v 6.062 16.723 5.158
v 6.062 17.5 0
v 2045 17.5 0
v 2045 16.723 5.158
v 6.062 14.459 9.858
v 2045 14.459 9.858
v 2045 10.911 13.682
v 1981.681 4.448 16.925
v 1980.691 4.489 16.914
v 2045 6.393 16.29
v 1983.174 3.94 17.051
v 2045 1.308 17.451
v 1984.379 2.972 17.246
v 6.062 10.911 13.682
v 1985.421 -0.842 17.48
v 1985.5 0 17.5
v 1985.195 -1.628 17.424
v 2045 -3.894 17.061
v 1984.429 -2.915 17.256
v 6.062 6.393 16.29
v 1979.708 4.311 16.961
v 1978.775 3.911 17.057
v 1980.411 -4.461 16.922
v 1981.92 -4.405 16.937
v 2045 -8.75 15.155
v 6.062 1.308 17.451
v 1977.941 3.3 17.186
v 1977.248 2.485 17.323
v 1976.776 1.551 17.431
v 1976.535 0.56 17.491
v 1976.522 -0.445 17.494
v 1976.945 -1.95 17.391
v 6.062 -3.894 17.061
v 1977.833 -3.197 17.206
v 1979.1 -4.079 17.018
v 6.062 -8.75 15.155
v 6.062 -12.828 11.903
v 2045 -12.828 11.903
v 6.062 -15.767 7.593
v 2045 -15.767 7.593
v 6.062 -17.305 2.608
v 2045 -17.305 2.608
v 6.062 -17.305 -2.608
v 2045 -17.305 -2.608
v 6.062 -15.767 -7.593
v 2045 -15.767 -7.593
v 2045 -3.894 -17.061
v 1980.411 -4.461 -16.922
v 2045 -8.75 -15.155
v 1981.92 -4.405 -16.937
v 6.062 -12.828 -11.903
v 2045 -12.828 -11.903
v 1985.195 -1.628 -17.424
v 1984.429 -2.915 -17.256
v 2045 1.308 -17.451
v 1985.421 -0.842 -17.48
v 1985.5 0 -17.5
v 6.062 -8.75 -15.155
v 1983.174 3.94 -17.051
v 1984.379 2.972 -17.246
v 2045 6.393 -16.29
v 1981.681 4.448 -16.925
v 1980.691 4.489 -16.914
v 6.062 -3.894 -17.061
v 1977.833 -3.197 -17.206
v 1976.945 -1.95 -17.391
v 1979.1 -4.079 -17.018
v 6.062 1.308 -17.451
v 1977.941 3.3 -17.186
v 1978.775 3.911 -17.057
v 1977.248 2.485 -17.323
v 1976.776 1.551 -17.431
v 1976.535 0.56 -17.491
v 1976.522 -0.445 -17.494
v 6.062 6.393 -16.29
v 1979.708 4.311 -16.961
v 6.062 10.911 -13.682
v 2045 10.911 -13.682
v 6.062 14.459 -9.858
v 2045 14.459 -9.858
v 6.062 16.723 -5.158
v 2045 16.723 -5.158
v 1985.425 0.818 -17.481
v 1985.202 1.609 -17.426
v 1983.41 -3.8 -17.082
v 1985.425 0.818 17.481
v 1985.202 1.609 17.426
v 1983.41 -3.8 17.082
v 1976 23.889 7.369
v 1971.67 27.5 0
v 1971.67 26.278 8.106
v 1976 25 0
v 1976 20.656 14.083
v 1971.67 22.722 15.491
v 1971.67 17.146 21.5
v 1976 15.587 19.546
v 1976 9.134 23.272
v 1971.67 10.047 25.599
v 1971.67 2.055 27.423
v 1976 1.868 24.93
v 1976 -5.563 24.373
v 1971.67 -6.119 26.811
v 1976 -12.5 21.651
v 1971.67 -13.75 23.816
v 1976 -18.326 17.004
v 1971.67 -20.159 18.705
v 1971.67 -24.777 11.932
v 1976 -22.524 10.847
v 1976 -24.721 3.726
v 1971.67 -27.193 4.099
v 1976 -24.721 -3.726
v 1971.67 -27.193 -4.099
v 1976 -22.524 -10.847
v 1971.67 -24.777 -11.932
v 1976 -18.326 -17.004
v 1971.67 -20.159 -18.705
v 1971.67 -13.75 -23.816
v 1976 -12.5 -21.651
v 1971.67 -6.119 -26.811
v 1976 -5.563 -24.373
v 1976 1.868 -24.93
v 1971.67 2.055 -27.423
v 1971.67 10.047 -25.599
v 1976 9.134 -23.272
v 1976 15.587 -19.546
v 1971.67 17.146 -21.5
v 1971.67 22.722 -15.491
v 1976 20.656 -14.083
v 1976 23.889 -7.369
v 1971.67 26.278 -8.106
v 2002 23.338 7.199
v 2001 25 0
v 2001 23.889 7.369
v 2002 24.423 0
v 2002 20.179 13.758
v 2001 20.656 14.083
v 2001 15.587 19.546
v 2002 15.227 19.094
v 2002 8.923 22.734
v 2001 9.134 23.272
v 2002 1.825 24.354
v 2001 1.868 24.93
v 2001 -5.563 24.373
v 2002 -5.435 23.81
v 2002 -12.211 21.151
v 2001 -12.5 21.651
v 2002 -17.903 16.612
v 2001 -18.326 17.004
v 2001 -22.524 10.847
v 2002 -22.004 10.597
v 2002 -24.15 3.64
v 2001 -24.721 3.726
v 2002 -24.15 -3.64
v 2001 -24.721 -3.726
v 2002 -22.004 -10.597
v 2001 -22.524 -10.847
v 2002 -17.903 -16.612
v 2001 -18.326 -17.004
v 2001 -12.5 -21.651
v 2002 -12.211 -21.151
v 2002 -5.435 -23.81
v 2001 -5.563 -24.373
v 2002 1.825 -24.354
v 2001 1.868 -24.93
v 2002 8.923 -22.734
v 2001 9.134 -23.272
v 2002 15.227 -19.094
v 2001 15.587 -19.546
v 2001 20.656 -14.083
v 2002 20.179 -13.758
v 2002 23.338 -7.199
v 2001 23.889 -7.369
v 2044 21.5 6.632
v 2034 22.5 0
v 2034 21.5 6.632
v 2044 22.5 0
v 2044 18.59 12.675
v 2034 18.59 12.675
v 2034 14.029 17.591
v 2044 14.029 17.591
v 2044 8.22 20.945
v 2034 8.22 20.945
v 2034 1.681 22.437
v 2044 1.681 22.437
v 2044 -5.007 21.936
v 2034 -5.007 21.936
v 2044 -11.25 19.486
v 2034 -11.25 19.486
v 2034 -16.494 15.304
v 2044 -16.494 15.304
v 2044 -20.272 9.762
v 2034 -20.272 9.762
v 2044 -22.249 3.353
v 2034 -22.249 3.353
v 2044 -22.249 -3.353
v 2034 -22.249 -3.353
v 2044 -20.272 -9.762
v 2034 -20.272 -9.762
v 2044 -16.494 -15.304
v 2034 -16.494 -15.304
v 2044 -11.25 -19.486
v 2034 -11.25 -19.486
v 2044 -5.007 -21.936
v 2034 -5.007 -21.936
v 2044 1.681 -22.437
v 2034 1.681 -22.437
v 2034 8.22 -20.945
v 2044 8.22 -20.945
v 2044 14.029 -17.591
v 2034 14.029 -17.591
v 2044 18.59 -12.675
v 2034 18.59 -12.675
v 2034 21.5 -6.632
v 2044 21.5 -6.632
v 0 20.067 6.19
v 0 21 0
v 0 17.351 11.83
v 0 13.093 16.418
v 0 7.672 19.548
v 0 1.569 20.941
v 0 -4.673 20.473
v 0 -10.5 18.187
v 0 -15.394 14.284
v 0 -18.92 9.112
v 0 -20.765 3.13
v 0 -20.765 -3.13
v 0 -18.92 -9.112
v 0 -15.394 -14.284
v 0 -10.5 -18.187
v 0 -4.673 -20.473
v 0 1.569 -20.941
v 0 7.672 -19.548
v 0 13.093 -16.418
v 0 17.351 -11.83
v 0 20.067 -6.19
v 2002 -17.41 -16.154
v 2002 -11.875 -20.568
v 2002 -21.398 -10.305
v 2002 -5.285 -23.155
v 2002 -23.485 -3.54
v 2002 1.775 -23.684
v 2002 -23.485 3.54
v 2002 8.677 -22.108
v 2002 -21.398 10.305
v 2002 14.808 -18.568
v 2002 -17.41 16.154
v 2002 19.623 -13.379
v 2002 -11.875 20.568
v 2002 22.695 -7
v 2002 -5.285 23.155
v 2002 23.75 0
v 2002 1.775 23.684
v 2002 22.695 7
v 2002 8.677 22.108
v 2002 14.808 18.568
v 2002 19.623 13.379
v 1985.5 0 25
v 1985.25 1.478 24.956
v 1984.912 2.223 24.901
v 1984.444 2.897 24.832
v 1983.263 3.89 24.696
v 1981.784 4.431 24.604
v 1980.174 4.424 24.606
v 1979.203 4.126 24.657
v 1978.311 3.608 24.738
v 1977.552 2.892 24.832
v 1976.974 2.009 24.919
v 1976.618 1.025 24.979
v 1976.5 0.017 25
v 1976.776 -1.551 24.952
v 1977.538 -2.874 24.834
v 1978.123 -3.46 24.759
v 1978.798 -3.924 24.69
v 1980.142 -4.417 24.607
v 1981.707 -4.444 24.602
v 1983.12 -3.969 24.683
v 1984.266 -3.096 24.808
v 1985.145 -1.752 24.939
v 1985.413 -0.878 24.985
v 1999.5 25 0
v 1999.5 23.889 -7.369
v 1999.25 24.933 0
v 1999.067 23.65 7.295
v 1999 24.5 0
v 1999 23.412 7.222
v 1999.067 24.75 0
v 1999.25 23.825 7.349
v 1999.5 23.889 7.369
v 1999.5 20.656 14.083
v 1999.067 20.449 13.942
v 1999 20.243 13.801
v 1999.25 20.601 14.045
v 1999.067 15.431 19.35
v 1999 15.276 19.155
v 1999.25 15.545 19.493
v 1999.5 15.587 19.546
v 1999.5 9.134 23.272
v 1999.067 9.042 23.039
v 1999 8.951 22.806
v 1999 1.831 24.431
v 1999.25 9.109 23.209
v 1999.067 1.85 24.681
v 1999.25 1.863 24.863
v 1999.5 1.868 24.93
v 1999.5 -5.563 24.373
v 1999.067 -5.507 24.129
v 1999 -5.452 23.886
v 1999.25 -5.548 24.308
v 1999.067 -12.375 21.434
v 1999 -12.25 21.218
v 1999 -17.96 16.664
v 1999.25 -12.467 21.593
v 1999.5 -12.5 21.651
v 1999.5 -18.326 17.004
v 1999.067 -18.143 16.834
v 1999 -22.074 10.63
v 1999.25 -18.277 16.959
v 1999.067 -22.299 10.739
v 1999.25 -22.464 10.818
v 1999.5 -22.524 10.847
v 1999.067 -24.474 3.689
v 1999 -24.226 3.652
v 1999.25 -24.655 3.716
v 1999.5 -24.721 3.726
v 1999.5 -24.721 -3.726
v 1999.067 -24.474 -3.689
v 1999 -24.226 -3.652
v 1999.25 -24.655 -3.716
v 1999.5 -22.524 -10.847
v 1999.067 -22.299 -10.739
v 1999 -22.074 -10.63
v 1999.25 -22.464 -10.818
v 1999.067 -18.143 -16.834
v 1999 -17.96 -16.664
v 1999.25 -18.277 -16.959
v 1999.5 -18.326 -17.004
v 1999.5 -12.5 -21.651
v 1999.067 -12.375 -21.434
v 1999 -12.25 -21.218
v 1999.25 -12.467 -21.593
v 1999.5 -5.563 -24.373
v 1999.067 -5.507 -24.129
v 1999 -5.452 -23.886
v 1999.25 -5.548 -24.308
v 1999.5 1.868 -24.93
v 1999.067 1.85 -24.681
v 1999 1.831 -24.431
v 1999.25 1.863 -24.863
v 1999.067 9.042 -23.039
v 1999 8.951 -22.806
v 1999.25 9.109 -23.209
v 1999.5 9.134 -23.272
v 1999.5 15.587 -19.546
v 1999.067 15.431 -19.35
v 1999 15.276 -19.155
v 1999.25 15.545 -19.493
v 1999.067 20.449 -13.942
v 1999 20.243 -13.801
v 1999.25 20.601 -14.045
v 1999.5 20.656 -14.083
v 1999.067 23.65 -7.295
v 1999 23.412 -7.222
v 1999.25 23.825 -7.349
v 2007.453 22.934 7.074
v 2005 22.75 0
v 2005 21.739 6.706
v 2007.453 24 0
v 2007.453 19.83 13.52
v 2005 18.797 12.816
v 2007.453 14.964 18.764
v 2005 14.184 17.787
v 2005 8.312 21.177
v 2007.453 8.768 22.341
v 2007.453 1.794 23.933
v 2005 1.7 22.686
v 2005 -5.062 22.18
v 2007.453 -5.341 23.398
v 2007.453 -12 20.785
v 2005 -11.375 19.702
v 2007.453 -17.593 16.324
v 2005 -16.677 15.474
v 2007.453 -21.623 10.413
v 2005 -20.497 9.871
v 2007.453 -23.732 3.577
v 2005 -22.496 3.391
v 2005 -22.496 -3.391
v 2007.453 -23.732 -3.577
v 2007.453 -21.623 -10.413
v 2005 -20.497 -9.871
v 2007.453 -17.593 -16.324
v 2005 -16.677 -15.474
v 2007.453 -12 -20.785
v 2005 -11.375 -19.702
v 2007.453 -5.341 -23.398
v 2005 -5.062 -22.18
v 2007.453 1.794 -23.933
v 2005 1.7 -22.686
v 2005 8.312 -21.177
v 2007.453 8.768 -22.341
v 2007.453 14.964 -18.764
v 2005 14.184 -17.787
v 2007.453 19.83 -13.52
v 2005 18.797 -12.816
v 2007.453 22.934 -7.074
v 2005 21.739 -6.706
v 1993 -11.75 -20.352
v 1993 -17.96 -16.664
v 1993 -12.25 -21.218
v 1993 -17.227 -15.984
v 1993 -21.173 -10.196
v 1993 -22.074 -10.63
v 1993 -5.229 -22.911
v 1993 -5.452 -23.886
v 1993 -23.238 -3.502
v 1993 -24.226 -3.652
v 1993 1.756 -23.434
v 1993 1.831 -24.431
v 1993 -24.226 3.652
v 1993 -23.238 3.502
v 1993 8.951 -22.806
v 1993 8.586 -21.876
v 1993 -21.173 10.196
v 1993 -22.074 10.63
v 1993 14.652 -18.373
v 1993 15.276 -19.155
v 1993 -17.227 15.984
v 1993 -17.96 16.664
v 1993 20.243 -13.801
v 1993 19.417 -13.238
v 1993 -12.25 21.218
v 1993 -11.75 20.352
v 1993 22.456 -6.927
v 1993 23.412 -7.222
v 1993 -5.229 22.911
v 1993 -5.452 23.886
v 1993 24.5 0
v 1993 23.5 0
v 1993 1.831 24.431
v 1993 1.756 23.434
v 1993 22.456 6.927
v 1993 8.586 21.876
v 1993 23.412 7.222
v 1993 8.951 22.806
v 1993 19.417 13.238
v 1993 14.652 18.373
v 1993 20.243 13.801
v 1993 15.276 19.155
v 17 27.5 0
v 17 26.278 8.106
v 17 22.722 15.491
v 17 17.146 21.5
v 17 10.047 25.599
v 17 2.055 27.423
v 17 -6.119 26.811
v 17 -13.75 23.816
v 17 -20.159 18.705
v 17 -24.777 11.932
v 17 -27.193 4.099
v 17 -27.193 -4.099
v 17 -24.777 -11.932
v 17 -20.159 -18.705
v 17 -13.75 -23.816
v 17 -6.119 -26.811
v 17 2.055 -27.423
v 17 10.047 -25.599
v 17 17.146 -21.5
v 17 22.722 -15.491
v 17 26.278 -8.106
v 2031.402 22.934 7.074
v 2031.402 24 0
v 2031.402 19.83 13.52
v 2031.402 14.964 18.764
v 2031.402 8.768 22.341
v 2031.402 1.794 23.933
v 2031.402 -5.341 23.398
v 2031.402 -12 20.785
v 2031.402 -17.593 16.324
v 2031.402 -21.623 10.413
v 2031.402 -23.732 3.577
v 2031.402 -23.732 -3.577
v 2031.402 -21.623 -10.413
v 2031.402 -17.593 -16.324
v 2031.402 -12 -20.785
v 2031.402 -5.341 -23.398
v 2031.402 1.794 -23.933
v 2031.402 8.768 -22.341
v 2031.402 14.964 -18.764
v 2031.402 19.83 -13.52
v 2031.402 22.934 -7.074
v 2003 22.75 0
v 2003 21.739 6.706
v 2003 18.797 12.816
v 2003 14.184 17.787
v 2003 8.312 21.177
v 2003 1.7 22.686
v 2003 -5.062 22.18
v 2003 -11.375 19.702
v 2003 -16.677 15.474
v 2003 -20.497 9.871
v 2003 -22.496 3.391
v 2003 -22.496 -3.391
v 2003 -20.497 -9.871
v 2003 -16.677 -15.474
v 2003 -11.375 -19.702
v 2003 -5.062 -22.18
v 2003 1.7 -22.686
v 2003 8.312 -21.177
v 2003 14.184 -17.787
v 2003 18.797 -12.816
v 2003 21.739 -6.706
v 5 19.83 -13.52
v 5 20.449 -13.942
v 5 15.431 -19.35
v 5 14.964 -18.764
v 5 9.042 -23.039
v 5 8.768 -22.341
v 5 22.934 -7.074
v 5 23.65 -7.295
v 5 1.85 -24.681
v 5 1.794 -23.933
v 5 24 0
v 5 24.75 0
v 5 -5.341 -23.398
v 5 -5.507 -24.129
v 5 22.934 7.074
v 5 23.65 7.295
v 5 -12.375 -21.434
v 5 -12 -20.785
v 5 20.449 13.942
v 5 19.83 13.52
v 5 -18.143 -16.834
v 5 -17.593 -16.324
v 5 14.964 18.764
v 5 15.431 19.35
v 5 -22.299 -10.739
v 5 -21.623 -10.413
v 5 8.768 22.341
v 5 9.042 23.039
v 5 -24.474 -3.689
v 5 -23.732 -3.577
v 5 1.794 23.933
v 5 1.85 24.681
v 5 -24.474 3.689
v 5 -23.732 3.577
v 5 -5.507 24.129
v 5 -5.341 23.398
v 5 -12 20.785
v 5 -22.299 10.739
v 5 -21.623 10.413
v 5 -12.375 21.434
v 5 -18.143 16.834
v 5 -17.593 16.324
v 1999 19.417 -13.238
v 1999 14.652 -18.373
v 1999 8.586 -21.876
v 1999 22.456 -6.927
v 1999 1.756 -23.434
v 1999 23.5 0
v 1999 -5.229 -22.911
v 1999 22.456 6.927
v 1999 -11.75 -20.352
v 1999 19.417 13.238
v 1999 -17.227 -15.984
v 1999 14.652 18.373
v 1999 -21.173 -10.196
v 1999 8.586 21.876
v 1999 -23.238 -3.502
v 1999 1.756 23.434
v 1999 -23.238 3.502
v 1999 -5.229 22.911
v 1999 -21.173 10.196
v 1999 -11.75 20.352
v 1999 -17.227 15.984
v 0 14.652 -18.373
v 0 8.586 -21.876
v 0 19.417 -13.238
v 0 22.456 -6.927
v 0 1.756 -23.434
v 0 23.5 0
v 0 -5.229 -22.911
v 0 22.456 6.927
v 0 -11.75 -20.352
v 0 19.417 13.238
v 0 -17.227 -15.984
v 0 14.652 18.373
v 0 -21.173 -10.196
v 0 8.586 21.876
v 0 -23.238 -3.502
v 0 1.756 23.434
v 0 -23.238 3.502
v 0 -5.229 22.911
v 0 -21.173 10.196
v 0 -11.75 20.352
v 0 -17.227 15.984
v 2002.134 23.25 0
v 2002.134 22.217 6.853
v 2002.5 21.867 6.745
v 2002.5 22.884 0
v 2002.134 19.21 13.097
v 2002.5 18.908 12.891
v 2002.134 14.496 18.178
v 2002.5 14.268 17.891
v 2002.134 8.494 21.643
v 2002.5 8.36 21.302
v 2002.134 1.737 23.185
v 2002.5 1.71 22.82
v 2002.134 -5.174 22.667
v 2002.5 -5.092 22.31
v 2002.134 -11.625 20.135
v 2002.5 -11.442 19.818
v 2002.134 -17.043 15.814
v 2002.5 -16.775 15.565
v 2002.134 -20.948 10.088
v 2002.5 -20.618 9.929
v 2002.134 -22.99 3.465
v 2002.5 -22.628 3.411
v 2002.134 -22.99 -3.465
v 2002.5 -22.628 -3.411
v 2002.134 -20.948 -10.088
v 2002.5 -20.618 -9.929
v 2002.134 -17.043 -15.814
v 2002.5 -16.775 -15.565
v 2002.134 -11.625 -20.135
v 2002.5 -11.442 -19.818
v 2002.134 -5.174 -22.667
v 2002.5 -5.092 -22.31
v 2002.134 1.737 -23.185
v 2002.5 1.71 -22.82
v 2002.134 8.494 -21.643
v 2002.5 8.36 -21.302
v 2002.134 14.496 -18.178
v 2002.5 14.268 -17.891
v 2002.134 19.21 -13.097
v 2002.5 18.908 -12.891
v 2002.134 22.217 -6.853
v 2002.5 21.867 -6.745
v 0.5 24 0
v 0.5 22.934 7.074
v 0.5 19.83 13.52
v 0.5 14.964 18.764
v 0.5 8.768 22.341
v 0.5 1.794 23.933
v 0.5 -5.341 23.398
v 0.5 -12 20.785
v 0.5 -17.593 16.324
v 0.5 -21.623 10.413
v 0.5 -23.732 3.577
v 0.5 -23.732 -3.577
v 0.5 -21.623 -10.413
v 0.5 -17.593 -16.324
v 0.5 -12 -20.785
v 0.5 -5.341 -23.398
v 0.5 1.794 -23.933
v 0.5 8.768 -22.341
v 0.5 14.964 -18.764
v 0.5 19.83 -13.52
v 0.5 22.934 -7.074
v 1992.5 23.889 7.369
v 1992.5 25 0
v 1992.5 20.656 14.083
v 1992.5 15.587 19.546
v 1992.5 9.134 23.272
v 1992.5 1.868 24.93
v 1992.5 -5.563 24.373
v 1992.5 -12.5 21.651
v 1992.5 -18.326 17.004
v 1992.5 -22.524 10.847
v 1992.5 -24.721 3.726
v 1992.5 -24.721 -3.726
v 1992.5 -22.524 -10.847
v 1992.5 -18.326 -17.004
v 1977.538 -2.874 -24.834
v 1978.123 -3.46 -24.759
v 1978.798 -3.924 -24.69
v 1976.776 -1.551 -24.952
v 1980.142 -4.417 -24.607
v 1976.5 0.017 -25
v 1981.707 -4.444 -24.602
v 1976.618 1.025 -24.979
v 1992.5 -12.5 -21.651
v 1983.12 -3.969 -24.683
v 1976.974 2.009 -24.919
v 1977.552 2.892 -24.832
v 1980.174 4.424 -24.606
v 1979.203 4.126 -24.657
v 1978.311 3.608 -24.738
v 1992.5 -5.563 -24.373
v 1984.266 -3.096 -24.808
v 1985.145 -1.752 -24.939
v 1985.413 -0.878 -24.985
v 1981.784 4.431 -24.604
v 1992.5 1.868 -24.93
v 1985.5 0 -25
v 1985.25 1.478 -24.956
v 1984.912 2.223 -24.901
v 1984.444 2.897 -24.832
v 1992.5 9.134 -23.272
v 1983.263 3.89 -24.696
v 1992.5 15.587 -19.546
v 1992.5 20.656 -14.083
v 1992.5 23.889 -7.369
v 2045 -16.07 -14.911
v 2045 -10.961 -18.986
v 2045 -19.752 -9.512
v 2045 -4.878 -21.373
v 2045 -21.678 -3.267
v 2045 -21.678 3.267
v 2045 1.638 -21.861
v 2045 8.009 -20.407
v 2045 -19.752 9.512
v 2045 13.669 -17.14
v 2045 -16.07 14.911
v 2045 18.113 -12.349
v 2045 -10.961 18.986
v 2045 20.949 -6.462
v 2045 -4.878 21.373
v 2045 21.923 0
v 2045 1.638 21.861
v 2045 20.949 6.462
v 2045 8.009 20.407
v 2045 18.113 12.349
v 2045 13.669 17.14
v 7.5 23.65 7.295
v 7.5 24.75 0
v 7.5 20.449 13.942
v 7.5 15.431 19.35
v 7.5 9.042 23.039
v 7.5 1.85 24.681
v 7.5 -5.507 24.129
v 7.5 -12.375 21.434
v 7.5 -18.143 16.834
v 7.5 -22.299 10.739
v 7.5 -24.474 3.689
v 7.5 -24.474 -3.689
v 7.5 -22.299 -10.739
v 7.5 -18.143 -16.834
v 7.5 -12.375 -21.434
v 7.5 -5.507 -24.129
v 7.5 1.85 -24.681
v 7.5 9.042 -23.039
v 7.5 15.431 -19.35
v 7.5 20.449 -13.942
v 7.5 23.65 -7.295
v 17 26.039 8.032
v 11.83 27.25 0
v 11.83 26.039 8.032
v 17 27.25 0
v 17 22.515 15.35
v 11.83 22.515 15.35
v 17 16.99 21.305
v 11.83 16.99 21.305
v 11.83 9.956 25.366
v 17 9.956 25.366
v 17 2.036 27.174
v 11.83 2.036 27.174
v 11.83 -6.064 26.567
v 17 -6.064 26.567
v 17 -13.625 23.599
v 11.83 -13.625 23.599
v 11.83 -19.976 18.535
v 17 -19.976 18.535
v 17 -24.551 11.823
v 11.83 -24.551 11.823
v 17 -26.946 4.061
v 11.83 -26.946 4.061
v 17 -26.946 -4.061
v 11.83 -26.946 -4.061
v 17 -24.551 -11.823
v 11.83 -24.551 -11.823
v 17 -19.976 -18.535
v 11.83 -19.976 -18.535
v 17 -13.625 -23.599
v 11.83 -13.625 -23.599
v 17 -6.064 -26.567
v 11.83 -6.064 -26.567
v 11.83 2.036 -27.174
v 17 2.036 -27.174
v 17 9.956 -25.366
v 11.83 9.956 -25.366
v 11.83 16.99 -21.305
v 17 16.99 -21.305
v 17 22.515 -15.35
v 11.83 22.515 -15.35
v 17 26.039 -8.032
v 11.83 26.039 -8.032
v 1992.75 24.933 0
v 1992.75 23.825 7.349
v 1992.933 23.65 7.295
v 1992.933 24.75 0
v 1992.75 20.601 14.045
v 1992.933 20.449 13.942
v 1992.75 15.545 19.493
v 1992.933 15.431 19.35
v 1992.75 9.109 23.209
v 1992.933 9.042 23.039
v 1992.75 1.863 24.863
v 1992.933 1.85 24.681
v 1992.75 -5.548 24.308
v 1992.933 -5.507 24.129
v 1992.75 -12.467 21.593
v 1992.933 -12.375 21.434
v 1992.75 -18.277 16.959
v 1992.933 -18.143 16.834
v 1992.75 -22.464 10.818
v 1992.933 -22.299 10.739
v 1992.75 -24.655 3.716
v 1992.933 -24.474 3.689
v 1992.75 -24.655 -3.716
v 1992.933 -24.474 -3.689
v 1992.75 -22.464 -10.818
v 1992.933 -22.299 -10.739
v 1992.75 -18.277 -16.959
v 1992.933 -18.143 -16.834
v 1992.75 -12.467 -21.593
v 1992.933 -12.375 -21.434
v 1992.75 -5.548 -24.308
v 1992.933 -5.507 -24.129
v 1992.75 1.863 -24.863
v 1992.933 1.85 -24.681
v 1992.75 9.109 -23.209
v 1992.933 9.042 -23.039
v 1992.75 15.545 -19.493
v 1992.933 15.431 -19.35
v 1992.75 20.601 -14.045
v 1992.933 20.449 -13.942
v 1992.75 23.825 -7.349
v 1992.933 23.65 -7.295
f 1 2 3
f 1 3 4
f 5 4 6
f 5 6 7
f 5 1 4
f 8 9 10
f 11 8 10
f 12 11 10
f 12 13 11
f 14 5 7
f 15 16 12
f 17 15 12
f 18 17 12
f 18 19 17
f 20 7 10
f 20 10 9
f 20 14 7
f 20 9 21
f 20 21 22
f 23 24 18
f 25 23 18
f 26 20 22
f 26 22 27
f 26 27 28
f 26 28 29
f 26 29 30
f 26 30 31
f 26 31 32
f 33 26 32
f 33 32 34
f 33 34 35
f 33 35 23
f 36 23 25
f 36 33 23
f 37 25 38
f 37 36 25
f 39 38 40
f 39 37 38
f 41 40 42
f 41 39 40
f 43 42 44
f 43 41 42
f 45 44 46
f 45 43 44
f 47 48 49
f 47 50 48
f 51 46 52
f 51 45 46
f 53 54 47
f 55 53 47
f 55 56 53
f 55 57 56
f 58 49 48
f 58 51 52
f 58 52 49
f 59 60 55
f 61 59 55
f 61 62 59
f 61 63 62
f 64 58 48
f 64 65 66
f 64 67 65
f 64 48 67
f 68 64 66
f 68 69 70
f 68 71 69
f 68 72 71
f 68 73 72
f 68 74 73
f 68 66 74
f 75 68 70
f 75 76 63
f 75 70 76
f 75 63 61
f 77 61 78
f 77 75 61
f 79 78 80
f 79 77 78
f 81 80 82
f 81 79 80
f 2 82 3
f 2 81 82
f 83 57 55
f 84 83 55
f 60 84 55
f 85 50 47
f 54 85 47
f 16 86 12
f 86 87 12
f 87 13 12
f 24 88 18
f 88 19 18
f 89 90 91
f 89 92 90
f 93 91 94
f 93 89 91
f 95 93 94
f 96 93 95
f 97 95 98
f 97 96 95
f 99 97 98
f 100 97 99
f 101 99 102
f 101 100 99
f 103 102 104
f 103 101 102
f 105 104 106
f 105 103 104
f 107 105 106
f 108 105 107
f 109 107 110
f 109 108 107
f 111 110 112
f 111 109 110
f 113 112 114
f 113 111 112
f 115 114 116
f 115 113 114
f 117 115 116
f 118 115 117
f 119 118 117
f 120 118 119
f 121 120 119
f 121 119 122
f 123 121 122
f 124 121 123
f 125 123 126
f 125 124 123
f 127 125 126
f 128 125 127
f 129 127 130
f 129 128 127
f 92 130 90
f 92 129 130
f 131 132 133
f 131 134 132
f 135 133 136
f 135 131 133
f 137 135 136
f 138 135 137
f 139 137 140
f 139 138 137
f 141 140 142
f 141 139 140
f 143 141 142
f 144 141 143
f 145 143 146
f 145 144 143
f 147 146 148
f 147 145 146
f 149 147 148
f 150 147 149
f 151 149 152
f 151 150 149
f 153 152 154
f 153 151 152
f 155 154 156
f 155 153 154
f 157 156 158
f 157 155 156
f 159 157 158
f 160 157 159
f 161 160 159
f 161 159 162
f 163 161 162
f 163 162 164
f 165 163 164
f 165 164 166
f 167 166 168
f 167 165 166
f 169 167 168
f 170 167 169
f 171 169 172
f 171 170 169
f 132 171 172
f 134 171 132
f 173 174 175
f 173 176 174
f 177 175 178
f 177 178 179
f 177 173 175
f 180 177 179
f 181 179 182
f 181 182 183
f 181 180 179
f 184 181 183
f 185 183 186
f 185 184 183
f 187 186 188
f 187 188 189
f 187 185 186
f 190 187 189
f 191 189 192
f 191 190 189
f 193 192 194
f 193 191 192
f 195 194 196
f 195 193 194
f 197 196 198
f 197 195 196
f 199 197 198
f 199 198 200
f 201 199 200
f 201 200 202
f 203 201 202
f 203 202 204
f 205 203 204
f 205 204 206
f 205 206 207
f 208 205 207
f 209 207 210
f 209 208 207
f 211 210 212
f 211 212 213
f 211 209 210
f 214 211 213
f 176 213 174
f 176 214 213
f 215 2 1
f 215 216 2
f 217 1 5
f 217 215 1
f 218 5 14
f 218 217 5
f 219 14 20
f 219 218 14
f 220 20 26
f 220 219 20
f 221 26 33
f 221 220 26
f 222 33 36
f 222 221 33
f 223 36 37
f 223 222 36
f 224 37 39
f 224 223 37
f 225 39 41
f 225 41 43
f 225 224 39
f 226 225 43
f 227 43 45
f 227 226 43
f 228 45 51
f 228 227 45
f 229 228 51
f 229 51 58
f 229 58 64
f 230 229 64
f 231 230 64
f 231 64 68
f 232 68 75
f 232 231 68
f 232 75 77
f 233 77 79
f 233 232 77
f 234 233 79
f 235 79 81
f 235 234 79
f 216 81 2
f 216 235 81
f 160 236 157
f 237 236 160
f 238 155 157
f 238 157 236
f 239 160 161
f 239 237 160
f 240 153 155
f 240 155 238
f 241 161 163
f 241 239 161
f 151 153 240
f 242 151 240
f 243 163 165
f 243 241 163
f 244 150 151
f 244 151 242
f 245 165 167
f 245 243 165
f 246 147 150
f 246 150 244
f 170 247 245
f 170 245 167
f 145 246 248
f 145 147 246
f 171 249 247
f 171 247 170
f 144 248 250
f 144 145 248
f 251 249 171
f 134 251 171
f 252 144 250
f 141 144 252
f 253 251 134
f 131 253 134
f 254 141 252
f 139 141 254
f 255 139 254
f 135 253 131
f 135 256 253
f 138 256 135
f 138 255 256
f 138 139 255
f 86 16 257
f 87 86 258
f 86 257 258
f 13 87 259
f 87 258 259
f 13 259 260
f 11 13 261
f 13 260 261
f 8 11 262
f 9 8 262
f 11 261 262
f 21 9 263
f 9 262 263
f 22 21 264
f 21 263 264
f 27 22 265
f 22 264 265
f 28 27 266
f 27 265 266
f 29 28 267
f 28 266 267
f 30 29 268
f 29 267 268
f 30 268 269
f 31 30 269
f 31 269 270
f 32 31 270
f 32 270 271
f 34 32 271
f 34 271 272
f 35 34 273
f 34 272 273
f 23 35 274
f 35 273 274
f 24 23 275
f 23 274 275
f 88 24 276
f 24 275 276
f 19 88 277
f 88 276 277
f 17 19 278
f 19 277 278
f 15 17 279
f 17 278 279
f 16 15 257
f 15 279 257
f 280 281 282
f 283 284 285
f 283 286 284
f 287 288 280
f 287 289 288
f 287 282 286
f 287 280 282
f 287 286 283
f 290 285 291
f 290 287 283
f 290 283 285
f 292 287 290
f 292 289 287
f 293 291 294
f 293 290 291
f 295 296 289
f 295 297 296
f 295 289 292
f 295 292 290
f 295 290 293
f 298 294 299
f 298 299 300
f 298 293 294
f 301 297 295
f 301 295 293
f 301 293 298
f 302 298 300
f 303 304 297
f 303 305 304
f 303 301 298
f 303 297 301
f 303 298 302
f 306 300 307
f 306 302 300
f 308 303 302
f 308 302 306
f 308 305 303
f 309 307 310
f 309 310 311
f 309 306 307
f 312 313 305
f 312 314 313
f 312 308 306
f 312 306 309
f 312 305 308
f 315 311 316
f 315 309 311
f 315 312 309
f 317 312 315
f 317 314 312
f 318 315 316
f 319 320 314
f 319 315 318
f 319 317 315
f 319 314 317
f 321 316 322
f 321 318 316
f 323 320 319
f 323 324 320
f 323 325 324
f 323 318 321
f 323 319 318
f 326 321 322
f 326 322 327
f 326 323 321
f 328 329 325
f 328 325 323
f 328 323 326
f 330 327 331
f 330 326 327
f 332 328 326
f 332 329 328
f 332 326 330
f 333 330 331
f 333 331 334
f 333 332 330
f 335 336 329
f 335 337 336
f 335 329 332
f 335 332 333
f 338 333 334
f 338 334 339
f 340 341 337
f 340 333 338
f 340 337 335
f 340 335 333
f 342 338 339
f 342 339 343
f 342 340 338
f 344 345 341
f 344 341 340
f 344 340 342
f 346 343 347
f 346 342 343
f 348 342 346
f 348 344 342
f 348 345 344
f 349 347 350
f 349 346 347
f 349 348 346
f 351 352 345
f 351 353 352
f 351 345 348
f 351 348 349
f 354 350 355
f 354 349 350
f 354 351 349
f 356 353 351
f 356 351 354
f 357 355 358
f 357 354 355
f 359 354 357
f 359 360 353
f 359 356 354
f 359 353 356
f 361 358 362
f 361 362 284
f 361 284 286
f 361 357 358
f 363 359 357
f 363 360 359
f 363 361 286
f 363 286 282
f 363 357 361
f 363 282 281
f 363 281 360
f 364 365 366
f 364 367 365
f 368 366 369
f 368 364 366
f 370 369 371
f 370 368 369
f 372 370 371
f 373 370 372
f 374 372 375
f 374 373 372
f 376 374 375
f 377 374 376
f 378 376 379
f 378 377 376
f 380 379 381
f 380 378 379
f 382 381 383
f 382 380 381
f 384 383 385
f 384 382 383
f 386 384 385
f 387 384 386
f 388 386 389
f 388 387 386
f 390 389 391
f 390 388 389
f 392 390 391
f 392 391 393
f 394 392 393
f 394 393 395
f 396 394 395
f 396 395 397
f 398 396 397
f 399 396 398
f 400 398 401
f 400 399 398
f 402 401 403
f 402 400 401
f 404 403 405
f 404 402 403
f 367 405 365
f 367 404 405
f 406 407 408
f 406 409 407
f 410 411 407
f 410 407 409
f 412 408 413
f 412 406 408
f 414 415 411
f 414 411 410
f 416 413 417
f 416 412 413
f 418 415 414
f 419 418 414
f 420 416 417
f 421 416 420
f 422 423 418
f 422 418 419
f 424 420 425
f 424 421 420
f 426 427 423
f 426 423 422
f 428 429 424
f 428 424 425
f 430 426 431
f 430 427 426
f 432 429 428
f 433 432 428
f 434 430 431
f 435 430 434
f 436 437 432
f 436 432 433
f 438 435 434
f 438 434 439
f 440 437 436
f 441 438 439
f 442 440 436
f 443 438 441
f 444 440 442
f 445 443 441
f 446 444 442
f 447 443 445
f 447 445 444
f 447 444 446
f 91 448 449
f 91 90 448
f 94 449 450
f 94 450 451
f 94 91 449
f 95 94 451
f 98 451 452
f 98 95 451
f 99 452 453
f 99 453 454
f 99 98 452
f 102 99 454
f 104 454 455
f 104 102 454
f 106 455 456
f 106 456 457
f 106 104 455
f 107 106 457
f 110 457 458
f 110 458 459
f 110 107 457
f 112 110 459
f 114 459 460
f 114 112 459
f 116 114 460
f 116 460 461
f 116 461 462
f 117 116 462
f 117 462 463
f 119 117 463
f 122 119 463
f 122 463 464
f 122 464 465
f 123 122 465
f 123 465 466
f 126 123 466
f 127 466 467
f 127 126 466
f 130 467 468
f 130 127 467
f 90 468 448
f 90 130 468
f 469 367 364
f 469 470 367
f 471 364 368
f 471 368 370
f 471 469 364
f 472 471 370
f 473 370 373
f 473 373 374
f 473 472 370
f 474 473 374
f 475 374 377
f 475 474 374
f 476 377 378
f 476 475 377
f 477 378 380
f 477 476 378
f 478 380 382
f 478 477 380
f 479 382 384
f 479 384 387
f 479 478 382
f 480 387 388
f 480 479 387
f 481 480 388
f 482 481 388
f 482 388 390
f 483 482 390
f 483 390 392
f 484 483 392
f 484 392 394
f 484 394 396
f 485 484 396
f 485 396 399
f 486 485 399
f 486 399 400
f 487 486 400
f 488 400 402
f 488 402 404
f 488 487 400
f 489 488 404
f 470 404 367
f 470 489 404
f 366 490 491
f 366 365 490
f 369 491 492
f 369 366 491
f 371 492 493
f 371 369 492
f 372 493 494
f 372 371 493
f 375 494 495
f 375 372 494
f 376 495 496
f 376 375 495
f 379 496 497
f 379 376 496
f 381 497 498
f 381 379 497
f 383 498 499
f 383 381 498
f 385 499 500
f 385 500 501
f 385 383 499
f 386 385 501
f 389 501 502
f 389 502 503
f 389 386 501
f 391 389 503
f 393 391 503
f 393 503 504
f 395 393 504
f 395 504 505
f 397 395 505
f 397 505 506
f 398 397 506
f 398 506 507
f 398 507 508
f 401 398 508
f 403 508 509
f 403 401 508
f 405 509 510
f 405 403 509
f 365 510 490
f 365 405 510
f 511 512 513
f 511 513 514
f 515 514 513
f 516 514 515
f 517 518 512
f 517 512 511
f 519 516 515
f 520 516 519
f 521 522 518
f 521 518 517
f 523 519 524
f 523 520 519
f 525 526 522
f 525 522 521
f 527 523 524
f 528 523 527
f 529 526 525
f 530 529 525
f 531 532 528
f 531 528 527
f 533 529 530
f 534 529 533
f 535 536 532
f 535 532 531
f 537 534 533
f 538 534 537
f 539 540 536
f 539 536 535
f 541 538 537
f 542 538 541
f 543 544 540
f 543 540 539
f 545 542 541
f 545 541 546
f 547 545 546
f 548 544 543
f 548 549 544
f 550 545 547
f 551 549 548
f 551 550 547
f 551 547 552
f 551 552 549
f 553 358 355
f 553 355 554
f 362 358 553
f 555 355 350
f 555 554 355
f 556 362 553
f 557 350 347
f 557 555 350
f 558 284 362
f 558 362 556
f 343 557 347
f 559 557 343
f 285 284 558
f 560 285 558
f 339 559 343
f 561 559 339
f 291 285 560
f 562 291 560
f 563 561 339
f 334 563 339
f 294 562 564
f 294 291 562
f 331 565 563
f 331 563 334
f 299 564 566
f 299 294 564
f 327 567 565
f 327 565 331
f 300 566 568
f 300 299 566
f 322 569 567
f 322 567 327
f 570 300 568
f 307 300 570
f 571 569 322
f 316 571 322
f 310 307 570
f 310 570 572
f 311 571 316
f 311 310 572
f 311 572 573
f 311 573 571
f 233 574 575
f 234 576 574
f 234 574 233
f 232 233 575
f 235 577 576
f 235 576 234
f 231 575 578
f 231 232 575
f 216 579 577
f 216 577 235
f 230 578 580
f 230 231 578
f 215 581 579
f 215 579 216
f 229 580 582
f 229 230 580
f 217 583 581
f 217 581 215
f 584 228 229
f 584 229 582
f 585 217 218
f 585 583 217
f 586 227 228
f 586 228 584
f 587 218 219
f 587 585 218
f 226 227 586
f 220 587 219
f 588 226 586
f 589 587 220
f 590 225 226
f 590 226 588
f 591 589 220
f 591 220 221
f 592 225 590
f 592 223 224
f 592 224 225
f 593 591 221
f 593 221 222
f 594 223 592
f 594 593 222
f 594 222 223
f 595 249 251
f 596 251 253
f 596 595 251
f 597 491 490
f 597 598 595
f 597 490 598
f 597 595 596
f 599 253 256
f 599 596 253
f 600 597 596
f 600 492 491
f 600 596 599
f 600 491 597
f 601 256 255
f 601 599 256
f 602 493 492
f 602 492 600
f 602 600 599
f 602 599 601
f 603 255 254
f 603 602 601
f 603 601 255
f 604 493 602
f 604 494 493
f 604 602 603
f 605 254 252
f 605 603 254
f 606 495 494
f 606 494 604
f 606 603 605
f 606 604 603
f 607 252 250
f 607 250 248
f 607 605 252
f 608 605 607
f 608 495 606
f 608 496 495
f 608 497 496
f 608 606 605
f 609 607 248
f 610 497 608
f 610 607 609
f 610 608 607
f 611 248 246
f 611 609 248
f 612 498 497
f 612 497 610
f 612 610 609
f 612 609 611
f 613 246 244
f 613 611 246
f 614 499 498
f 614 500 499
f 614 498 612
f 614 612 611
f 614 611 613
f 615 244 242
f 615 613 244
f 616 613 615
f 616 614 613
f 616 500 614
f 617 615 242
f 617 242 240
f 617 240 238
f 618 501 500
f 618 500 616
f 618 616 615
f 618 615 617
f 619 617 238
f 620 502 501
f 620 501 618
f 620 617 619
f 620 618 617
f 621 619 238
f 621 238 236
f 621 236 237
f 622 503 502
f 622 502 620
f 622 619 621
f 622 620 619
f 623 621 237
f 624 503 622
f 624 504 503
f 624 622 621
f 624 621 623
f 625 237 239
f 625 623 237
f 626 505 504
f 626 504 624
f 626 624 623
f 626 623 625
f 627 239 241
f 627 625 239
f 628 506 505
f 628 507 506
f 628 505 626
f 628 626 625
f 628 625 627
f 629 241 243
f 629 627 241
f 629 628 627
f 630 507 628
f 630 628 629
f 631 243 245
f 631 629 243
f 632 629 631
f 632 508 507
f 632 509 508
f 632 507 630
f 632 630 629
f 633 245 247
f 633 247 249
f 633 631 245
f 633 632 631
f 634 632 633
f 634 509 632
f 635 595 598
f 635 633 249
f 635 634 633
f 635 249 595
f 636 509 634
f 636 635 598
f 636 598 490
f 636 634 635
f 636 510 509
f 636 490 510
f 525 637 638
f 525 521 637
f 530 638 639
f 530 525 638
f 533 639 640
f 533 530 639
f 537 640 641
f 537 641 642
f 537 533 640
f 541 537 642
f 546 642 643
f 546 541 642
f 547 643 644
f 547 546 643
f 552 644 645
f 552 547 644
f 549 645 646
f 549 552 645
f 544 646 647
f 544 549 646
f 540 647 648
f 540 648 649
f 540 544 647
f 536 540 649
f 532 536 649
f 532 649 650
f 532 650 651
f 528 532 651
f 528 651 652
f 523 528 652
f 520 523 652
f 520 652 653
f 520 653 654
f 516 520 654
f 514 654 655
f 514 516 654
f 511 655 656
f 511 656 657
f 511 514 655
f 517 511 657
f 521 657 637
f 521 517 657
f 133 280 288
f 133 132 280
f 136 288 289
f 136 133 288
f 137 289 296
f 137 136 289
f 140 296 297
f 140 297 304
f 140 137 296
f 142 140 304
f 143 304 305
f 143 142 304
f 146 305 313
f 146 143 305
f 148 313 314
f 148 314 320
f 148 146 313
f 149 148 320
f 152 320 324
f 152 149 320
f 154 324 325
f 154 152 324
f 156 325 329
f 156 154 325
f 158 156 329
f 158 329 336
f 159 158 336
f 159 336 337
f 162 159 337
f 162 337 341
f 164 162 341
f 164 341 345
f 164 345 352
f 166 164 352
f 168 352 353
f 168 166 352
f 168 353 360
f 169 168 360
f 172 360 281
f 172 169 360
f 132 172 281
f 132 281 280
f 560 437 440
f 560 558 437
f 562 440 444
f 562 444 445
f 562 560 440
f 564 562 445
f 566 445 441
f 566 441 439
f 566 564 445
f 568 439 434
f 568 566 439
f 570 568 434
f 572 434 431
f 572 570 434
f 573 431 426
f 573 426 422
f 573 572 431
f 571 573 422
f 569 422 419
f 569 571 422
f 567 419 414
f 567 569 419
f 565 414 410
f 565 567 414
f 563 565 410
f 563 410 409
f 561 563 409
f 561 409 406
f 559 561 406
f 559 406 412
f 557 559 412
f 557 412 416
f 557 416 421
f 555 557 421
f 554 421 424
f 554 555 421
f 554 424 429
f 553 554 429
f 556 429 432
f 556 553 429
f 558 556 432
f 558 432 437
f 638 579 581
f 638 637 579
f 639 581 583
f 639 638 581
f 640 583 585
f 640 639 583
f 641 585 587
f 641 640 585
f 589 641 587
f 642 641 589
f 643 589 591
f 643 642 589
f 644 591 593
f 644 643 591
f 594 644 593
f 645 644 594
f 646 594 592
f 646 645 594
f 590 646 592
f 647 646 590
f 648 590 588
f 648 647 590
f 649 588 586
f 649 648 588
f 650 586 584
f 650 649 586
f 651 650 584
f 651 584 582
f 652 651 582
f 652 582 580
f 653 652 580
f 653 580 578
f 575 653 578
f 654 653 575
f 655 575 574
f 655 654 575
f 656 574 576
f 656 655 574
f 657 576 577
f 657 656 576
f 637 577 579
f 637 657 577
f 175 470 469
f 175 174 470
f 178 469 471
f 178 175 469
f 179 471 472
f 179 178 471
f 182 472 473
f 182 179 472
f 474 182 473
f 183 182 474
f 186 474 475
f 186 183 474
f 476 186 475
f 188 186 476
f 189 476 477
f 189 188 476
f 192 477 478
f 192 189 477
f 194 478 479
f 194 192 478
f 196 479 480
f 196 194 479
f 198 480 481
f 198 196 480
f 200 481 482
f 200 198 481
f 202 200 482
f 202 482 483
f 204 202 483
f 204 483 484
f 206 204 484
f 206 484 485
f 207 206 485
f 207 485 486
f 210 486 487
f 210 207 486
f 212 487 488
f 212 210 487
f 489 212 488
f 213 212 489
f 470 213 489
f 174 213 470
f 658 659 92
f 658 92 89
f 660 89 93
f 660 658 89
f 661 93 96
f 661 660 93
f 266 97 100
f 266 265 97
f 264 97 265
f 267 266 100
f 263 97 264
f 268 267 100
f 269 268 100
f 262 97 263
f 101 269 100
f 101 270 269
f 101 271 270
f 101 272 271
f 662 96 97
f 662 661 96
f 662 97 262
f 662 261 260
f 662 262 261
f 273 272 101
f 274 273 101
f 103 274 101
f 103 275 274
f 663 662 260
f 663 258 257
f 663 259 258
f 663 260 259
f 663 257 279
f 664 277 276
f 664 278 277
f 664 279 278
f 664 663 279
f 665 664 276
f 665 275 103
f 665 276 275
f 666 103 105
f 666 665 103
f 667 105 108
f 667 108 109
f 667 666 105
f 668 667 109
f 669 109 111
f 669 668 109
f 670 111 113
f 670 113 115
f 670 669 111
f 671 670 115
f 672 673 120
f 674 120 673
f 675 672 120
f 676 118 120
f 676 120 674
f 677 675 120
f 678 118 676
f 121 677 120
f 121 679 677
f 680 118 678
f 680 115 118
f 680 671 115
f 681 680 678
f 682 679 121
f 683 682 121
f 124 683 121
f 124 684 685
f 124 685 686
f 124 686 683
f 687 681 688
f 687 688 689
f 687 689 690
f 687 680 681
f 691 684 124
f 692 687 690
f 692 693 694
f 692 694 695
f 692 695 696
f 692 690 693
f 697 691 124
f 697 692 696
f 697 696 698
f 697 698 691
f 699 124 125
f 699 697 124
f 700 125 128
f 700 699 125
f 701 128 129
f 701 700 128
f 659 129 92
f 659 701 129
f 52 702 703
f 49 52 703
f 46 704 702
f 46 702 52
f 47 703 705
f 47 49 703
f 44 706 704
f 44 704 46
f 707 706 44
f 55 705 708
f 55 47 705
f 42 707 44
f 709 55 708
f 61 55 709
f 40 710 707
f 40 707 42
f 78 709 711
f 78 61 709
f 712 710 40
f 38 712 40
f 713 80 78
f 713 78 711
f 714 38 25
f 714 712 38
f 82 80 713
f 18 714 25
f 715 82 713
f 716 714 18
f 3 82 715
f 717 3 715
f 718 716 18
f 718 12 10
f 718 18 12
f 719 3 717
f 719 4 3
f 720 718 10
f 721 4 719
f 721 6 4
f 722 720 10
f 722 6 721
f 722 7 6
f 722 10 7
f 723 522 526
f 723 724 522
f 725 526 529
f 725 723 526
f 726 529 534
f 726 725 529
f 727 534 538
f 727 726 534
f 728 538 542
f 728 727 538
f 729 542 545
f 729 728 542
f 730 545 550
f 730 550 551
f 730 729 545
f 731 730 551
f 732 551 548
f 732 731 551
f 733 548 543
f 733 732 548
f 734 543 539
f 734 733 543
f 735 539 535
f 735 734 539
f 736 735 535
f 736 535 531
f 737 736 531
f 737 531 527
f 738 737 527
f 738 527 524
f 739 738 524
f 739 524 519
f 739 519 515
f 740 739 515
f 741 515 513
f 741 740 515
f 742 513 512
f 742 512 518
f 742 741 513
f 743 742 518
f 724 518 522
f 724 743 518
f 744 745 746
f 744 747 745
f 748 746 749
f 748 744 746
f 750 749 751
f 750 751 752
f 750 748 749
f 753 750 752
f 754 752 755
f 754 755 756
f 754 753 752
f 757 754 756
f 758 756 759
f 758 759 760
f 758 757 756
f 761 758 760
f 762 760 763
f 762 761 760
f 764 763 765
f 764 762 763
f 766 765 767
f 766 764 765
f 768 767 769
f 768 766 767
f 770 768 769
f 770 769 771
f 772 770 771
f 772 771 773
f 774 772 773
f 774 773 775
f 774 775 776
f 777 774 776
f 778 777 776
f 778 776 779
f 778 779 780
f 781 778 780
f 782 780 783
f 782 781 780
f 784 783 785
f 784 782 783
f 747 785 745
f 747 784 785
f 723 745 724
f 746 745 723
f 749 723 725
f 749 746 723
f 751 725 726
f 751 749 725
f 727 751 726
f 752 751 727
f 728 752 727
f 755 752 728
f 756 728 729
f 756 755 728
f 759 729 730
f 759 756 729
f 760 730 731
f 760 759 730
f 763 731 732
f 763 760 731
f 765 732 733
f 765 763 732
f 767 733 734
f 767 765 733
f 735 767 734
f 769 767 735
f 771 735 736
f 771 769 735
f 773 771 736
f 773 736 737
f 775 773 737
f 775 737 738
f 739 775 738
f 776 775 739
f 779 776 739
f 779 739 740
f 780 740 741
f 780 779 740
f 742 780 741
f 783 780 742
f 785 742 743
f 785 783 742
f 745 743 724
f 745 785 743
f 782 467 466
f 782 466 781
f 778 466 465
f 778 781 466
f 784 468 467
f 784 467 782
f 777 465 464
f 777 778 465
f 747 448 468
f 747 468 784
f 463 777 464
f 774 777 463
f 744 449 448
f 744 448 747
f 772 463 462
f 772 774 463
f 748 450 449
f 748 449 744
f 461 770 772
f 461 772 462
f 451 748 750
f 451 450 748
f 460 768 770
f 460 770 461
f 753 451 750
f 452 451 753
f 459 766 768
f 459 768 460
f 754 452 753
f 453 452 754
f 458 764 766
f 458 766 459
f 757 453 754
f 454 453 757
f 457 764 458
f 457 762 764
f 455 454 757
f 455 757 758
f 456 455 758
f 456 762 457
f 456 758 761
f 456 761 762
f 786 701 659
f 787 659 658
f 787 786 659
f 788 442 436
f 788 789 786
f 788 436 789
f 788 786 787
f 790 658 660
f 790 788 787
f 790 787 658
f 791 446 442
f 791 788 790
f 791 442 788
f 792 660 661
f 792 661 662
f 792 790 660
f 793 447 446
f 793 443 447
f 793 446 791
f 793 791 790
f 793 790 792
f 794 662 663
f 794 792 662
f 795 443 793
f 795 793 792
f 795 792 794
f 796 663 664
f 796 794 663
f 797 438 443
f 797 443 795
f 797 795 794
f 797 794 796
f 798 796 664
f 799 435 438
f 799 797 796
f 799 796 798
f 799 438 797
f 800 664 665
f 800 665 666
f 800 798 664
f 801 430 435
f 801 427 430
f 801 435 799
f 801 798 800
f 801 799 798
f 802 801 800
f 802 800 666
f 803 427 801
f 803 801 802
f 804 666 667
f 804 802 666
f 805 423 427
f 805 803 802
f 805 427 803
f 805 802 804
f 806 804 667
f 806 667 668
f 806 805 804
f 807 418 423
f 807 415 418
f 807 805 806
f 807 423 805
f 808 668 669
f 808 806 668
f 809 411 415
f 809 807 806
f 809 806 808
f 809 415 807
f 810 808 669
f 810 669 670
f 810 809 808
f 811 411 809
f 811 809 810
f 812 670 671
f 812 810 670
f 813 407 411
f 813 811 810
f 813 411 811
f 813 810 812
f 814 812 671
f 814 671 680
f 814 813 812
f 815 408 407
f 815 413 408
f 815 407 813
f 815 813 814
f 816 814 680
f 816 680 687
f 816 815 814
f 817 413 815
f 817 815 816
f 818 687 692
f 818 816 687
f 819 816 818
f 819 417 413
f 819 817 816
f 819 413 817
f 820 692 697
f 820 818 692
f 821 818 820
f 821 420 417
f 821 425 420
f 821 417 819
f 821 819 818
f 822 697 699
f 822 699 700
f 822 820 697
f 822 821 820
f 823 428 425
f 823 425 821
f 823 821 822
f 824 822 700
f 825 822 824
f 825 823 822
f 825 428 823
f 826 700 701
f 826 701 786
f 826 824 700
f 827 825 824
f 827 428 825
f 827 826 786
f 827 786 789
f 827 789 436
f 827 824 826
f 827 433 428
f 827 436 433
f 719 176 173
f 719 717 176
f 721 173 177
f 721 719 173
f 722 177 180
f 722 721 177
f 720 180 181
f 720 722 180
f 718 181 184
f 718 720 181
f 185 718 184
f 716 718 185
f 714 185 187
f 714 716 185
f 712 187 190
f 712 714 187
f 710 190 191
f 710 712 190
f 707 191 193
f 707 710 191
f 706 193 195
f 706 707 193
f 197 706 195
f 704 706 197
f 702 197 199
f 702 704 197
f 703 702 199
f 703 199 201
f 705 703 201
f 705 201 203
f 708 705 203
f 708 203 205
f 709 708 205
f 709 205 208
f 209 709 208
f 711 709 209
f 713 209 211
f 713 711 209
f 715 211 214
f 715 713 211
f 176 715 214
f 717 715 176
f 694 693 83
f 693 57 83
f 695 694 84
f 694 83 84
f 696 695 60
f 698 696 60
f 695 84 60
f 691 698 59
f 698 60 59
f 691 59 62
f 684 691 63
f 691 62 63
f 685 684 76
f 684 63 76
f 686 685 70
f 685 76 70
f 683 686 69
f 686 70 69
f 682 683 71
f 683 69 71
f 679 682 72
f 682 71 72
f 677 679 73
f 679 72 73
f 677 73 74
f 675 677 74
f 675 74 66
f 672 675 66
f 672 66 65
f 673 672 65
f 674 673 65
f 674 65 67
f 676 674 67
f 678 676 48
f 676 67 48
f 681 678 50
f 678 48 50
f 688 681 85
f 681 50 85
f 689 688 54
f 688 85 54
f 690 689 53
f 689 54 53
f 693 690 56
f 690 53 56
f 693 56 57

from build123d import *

# Parameters (mm, degrees)
SKETCH2_R                  = 4.5
F_9_GENNEMG_ENDE_HUL_DEPTH = 50


with BuildPart() as part:
    # Sketch1 → Base-Revolve (revolve)
    with BuildSketch(Plane.XY):
        with BuildLine():
            Line((0, 21), (0, 23.5))
            Line((0, 23.5), (0.5, 24))
            Line((0.5, 24), (5, 24))
            Line((5, 24), (5, 24.75))
            Line((5, 24.75), (7.5, 24.75))
            Line((7.5, 24.75), (11.830127019, 27.25))
            Line((11.830127019, 27.25), (17, 27.25))
            Line((17, 27.25), (17, 27.5))
            Line((17, 27.5), (1971.669872981, 27.5))
            Line((1971.669872981, 27.5), (1976, 25))
            Line((1976, 25), (1992.5, 25))
            ThreePointArc((1992.5, 25), (1992.853553391, 24.853553391), (1993, 24.5))
            Line((1993, 24.5), (1993, 23.5))
            Line((1993, 23.5), (1999, 23.5))
            Line((1999, 23.5), (1999, 24.5))
            ThreePointArc((1999, 24.5), (1999.146446609, 24.853553391), (1999.5, 25))
            Line((1999.5, 25), (2001, 25))
            Line((2001, 25), (2002, 24.422649731))
            Line((2002, 24.422649731), (2002, 23.75))
            ThreePointArc((2002, 23.75), (2002.292893219, 23.042893219), (2003, 22.75))
            Line((2003, 22.75), (2005, 22.75))
            Line((2005, 22.75), (2007.453263132, 24))
            Line((2007.453263132, 24), (2031.401923789, 24))
            Line((2031.401923789, 24), (2034, 22.5))
            Line((2034, 22.5), (2044, 22.5))
            Line((2044, 22.5), (2045, 21.922649731))
            Line((2045, 21.922649731), (2045, 17.5))
            Line((2045, 17.5), (6.062177826, 17.5))
            Line((6.062177826, 17.5), (0, 21))
        make_face()
    revolve(axis=Axis((0, 0, 0), (1, 0, 0)))

    # Sketch2 → ø9 gennemgående hul (cut, symmetric)
    with BuildSketch(Plane.XY):
        with Locations((1981, 0)):
            Circle(SKETCH2_R)
    extrude(amount=F_9_GENNEMG_ENDE_HUL_DEPTH, both=True, mode=Mode.SUBTRACT)


solid = part.part
